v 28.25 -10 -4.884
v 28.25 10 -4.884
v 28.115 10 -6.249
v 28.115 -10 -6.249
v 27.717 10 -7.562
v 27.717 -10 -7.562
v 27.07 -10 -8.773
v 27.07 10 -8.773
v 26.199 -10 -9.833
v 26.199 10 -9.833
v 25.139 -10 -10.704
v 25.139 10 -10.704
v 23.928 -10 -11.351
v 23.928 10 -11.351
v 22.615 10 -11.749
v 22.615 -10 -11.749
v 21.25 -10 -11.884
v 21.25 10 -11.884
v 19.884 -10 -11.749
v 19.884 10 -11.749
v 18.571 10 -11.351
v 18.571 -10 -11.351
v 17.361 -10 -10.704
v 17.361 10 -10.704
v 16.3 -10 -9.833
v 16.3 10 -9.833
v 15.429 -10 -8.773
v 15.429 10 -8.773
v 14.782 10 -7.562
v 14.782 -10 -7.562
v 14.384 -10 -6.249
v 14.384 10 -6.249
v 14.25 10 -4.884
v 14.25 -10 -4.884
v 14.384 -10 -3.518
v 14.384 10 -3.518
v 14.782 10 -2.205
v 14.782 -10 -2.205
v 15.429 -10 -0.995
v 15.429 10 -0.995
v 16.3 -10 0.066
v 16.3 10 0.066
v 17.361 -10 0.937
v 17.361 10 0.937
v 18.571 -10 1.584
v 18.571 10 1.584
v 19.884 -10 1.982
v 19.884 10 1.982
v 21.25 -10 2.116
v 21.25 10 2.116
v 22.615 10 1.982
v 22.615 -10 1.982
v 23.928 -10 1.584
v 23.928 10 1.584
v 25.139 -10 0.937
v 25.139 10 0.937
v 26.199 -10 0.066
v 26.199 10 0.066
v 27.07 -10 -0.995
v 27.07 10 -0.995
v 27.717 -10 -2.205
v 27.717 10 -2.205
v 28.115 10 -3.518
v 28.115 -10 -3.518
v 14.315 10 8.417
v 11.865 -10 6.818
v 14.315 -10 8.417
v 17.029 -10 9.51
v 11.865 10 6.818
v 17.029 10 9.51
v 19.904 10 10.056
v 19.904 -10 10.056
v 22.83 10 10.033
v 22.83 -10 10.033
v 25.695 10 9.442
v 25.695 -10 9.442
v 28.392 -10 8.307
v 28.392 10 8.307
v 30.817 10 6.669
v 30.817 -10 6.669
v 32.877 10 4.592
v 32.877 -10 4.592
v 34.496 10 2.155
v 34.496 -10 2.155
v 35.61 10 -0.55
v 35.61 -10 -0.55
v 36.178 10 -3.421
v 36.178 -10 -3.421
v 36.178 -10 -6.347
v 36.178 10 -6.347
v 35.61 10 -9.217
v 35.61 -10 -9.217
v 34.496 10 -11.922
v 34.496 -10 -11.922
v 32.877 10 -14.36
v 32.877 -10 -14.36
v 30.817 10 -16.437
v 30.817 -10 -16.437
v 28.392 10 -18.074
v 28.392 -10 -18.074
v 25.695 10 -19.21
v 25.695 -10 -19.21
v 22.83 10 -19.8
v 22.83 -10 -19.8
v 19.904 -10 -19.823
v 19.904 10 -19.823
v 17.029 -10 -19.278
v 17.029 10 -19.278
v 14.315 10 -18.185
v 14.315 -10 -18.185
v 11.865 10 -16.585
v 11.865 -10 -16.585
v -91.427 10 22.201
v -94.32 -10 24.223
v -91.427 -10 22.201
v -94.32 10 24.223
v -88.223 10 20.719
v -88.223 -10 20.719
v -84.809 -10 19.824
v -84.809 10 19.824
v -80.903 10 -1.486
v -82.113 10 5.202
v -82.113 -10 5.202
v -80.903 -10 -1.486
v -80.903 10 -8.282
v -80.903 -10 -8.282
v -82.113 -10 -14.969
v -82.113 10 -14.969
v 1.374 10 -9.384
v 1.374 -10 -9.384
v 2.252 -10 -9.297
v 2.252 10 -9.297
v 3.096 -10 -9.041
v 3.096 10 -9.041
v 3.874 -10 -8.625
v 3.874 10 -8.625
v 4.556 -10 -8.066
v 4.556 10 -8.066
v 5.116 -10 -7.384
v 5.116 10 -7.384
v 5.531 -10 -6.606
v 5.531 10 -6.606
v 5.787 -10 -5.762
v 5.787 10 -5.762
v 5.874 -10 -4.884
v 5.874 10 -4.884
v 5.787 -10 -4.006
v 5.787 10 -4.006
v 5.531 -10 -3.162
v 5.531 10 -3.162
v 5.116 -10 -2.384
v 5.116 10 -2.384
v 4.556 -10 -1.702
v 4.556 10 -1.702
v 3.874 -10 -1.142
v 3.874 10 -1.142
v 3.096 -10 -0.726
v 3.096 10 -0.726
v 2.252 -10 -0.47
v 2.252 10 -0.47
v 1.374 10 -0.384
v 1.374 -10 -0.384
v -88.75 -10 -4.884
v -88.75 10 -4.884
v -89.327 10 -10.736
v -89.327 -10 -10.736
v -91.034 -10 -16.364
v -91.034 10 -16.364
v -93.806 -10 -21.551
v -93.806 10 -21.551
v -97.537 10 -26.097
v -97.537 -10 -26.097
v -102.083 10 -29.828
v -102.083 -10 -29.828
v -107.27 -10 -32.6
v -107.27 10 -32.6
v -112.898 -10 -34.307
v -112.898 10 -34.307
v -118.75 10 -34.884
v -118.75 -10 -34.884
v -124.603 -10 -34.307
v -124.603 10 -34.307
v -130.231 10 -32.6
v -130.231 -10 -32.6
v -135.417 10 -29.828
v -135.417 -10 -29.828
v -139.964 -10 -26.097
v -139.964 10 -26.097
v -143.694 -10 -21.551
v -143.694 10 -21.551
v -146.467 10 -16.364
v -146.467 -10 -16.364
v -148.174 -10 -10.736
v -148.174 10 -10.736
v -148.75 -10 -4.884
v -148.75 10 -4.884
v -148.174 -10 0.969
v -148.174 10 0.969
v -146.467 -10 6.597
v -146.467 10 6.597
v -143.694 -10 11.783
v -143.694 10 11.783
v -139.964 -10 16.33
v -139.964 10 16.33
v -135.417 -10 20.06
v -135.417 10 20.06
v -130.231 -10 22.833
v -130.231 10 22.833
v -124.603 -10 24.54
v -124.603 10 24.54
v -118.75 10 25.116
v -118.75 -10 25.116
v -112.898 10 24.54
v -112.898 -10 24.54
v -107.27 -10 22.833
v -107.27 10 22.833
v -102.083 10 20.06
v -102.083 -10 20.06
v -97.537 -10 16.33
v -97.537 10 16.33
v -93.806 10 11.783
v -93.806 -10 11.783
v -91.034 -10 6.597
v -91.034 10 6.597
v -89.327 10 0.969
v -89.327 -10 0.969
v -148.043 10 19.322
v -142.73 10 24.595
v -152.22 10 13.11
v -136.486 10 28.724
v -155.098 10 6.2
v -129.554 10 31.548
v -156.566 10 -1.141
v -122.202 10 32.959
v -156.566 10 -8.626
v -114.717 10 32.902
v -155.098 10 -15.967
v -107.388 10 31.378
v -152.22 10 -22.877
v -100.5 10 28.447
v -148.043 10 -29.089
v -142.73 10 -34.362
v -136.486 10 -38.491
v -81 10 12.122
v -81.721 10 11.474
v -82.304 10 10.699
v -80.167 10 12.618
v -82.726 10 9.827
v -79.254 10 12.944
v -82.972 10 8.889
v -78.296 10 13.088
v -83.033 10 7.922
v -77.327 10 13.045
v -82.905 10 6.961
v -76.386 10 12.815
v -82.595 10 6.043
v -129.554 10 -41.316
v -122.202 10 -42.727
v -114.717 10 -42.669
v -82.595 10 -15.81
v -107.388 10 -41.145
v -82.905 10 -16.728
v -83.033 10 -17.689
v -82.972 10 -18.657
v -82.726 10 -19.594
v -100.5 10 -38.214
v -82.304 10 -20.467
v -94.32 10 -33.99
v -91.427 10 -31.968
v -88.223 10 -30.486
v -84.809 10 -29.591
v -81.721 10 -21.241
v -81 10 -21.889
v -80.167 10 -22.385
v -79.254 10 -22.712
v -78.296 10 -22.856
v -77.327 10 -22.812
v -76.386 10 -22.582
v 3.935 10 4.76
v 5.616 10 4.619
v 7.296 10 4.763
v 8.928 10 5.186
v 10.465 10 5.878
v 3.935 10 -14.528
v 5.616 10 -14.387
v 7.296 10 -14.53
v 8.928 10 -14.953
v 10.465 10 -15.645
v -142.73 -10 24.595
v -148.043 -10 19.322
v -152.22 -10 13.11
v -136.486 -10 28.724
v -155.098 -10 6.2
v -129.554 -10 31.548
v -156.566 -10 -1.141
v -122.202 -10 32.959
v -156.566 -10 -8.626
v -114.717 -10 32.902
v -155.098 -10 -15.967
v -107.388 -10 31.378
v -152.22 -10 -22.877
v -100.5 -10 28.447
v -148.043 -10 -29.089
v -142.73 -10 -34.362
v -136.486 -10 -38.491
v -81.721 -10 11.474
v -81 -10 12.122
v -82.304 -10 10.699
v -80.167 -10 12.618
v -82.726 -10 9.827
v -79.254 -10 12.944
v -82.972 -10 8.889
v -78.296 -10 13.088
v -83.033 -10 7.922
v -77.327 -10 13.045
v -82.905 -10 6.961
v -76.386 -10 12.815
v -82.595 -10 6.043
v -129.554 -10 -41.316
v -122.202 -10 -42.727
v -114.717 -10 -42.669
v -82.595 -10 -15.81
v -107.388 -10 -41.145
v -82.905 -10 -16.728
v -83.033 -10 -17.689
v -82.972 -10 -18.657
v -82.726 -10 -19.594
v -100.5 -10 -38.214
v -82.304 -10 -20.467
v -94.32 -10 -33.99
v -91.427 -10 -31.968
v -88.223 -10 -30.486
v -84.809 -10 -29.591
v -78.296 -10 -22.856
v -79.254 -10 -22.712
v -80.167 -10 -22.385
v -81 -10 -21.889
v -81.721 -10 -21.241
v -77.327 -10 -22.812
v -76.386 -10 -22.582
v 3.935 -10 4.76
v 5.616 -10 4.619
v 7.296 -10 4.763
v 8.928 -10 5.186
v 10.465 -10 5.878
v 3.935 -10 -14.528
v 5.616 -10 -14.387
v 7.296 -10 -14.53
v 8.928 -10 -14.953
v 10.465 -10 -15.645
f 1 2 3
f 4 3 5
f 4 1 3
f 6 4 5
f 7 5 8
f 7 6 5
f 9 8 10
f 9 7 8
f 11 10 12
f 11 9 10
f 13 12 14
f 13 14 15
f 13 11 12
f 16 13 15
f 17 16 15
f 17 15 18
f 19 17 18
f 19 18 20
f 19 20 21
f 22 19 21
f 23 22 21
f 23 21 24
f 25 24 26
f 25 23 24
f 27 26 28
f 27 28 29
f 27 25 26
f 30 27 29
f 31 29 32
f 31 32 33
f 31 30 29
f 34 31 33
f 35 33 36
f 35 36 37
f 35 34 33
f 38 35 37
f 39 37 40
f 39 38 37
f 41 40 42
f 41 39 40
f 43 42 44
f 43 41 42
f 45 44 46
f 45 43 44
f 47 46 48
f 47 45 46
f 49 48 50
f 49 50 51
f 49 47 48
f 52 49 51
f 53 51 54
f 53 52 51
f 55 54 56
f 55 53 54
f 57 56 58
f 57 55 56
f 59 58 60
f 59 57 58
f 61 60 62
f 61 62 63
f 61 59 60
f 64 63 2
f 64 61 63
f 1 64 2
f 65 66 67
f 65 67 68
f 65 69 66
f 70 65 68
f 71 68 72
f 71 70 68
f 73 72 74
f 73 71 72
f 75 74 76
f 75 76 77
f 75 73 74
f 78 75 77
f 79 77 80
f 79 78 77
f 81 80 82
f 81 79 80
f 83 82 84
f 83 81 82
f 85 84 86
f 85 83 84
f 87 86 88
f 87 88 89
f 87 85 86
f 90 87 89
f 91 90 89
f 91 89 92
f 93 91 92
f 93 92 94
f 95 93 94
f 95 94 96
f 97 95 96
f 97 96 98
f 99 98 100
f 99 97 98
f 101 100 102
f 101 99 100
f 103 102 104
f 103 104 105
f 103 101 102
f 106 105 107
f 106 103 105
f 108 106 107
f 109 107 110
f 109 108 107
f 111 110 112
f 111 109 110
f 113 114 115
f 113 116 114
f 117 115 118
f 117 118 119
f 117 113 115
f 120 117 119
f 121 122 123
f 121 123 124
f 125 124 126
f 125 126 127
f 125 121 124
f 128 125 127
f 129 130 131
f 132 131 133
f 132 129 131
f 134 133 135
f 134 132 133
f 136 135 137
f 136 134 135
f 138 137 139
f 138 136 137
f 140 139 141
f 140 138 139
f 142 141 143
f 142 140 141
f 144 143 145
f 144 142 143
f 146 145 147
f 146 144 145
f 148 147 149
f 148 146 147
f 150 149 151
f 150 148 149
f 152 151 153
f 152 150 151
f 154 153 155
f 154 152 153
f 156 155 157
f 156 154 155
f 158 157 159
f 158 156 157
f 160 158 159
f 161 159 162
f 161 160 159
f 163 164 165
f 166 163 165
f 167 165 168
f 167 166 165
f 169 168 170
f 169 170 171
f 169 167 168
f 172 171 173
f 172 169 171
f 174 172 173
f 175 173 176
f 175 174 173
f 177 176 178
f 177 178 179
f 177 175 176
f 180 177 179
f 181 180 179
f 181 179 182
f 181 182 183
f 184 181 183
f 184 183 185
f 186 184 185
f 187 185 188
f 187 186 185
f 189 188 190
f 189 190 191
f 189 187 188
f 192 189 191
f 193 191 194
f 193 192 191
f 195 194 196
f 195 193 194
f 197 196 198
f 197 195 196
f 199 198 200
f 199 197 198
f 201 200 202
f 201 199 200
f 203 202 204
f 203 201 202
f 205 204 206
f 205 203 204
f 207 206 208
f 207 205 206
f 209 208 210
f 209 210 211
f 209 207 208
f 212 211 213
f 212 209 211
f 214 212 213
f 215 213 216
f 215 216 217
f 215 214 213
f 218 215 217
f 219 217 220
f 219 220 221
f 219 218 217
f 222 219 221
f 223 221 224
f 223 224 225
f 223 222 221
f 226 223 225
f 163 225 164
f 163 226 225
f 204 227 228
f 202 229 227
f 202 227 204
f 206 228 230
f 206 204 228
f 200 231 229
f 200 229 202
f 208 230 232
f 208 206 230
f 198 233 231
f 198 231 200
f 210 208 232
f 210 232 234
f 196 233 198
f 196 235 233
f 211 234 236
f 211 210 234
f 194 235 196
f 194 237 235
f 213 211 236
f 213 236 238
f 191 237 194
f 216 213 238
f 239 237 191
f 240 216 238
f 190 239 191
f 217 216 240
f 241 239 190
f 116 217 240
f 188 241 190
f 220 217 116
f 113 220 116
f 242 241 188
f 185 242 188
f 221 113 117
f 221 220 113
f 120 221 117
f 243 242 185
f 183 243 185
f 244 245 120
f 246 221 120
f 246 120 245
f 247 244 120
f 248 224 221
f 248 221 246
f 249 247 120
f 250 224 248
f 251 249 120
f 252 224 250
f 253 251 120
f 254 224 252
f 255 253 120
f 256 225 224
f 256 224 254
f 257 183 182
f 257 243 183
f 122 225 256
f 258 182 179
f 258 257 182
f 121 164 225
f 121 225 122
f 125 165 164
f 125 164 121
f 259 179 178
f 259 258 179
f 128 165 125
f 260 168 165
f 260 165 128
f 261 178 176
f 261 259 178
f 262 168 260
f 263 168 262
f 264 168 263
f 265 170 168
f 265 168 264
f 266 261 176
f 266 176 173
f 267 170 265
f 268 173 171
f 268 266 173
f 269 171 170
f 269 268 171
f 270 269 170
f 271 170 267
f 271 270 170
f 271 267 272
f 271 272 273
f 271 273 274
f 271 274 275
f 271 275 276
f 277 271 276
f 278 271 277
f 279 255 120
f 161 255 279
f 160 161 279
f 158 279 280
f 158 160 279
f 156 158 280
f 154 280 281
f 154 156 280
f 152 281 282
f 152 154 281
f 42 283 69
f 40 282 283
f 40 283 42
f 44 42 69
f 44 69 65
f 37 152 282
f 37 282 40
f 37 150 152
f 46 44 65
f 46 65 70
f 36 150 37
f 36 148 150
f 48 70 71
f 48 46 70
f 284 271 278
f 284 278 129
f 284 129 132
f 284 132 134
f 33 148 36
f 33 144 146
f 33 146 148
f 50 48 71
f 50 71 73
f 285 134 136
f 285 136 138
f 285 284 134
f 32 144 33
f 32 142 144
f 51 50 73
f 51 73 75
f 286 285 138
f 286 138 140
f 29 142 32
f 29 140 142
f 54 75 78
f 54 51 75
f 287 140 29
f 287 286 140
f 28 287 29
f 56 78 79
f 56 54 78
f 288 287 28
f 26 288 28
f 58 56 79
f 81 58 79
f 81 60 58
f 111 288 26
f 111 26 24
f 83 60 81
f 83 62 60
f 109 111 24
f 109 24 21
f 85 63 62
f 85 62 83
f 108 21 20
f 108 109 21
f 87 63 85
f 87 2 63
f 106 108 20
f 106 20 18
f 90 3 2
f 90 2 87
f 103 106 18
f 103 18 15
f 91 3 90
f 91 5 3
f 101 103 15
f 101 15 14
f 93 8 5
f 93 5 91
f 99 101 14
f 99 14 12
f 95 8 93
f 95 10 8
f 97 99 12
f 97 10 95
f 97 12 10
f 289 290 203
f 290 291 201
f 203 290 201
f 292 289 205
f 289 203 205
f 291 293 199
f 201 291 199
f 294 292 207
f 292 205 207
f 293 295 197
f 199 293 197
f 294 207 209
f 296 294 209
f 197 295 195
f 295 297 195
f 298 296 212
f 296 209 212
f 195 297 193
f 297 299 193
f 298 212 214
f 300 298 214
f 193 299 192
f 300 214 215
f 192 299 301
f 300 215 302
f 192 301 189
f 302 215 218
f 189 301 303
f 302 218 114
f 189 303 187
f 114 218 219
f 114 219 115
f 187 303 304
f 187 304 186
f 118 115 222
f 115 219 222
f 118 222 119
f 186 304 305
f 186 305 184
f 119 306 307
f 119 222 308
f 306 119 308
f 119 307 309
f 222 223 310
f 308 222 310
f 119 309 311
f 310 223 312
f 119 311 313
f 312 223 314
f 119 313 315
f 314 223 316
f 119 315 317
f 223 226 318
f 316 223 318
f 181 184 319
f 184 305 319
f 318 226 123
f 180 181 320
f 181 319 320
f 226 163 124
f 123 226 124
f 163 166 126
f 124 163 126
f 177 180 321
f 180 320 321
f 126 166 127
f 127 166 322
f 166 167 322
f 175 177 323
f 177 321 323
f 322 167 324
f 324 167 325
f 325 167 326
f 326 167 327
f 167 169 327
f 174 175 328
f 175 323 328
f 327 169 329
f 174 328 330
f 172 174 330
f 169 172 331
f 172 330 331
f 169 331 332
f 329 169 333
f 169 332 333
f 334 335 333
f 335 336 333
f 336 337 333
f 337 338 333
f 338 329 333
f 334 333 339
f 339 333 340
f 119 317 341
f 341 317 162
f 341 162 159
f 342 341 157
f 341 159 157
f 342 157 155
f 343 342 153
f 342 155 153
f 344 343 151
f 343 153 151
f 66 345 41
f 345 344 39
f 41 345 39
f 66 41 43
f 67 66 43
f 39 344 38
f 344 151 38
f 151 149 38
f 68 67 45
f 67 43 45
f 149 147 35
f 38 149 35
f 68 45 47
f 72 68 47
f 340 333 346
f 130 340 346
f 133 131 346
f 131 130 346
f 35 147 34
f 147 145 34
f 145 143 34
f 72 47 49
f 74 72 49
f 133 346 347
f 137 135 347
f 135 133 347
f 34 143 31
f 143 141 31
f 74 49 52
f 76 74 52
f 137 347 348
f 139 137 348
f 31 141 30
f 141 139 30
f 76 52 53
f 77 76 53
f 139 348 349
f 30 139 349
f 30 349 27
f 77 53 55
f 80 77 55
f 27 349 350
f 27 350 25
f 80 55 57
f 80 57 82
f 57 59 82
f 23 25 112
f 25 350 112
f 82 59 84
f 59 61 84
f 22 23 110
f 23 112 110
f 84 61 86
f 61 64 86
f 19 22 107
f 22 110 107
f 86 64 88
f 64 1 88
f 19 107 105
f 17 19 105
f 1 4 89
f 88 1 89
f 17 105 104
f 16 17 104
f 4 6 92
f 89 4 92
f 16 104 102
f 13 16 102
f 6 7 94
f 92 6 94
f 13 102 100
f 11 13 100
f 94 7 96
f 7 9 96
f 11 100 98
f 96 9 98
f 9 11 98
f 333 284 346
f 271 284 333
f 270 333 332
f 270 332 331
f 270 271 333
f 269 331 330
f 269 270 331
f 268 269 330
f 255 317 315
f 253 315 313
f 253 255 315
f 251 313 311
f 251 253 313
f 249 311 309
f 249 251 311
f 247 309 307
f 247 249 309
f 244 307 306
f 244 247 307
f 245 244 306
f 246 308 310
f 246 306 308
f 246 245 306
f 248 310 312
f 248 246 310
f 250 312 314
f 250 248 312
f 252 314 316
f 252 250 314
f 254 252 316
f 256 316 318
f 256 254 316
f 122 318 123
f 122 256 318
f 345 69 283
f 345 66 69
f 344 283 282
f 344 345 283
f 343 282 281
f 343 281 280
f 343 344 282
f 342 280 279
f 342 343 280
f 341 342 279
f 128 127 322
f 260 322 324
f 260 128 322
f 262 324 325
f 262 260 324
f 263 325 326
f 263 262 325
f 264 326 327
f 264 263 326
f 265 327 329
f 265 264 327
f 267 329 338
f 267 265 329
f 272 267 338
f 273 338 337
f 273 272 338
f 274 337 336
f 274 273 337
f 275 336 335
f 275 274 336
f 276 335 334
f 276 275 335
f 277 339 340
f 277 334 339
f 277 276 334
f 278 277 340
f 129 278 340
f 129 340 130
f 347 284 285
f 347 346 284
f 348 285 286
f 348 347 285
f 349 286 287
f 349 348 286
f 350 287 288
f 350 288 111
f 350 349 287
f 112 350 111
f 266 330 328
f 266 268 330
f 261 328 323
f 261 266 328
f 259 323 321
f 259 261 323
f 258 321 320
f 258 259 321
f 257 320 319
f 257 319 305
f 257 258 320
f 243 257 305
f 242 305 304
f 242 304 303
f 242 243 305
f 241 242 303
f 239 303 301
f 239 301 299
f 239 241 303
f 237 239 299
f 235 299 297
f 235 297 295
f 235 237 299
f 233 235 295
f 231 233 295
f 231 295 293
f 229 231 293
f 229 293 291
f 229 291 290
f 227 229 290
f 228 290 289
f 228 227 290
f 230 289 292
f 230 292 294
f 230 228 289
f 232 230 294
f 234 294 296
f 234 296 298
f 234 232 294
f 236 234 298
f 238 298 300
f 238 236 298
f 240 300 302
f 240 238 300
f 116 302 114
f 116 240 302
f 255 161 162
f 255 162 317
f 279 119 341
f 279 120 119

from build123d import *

# Parameters (mm, degrees)
SKETCH1_R           = 30
SKETCH1_R_2         = 7
BOSS_EXTRUDE1_DEPTH = 10
FILLET1_R           = 10
FILLET2_R           = 20
CUT_EXTRUDE1_DEPTH  = 21


with BuildPart() as part:
    # Sketch1 → Boss-Extrude1 (new body, symmetric)
    with BuildSketch(Plane(origin=(0, 0, 0), x_dir=(1, 0, 0), z_dir=(0, 1, 0))):
        with BuildLine():
            Line((9.080898408, 13.654134499), (-90.777819418, 30.604008061))
            ThreePointArc((-90.777819418, 30.604008061), (-156.75035362, 4.883640056), (-90.777819418, -20.836727949))
            Line((-90.777819418, -20.836727949), (9.080898408, -3.886854388))
            ThreePointArc((9.080898408, -3.886854388), (36.24964638, 4.883640056), (9.080898408, 13.654134499))
        make_face()
        with Locations((-118.75035362, 4.883640056)):
            Circle(SKETCH1_R, mode=Mode.SUBTRACT)
        with Locations((21.24964638, 4.883640056)):
            Circle(SKETCH1_R_2, mode=Mode.SUBTRACT)
    extrude(amount=BOSS_EXTRUDE1_DEPTH, both=True)

    # Fillet1
    fillet1_edges = [part.edges().sort_by_distance(p)[0] for p in [
        (9.080898408, 0, -13.654134499),
        (9.080898408, 0, 3.886854388),
    ]]
    fillet(fillet1_edges, radius=FILLET1_R)

    # Fillet2
    fillet2_edges = [part.edges().sort_by_distance(p)[0] for p in [
        (-90.777819418, 0, 20.836727949),
        (-90.777819418, 0, -30.604008061),
    ]]
    fillet(fillet2_edges, radius=FILLET2_R)

    # Sketch2 → Cut-Extrude1 (cut, through all)
    with BuildSketch(Plane(origin=(0, 10, 0), x_dir=(1, 0, 0), z_dir=(0, 1, 0))):
        with BuildLine():
            Line((-76.385663344, 22.582436294), (1.373906039, 9.383640056))
            ThreePointArc((1.373906039, 9.383640056), (5.873906039, 4.883640056), (1.373906039, 0.383640056))
            Line((1.373906039, 0.383640056), (-76.385663344, -12.815156183))
            ThreePointArc((-76.385663344, -12.815156183), (-82.031183012, -11.100966392), (-82.113079878, -5.201506089))
            ThreePointArc((-82.113079878, -5.201506089), (-80.75035362, 4.883640056), (-82.113079878, 14.968786201))
            ThreePointArc((-82.113079878, 14.968786201), (-82.031183012, 20.868246504), (-76.385663344, 22.582436294))
        make_face()
    extrude(amount=-CUT_EXTRUDE1_DEPTH, mode=Mode.SUBTRACT)


solid = part.part
